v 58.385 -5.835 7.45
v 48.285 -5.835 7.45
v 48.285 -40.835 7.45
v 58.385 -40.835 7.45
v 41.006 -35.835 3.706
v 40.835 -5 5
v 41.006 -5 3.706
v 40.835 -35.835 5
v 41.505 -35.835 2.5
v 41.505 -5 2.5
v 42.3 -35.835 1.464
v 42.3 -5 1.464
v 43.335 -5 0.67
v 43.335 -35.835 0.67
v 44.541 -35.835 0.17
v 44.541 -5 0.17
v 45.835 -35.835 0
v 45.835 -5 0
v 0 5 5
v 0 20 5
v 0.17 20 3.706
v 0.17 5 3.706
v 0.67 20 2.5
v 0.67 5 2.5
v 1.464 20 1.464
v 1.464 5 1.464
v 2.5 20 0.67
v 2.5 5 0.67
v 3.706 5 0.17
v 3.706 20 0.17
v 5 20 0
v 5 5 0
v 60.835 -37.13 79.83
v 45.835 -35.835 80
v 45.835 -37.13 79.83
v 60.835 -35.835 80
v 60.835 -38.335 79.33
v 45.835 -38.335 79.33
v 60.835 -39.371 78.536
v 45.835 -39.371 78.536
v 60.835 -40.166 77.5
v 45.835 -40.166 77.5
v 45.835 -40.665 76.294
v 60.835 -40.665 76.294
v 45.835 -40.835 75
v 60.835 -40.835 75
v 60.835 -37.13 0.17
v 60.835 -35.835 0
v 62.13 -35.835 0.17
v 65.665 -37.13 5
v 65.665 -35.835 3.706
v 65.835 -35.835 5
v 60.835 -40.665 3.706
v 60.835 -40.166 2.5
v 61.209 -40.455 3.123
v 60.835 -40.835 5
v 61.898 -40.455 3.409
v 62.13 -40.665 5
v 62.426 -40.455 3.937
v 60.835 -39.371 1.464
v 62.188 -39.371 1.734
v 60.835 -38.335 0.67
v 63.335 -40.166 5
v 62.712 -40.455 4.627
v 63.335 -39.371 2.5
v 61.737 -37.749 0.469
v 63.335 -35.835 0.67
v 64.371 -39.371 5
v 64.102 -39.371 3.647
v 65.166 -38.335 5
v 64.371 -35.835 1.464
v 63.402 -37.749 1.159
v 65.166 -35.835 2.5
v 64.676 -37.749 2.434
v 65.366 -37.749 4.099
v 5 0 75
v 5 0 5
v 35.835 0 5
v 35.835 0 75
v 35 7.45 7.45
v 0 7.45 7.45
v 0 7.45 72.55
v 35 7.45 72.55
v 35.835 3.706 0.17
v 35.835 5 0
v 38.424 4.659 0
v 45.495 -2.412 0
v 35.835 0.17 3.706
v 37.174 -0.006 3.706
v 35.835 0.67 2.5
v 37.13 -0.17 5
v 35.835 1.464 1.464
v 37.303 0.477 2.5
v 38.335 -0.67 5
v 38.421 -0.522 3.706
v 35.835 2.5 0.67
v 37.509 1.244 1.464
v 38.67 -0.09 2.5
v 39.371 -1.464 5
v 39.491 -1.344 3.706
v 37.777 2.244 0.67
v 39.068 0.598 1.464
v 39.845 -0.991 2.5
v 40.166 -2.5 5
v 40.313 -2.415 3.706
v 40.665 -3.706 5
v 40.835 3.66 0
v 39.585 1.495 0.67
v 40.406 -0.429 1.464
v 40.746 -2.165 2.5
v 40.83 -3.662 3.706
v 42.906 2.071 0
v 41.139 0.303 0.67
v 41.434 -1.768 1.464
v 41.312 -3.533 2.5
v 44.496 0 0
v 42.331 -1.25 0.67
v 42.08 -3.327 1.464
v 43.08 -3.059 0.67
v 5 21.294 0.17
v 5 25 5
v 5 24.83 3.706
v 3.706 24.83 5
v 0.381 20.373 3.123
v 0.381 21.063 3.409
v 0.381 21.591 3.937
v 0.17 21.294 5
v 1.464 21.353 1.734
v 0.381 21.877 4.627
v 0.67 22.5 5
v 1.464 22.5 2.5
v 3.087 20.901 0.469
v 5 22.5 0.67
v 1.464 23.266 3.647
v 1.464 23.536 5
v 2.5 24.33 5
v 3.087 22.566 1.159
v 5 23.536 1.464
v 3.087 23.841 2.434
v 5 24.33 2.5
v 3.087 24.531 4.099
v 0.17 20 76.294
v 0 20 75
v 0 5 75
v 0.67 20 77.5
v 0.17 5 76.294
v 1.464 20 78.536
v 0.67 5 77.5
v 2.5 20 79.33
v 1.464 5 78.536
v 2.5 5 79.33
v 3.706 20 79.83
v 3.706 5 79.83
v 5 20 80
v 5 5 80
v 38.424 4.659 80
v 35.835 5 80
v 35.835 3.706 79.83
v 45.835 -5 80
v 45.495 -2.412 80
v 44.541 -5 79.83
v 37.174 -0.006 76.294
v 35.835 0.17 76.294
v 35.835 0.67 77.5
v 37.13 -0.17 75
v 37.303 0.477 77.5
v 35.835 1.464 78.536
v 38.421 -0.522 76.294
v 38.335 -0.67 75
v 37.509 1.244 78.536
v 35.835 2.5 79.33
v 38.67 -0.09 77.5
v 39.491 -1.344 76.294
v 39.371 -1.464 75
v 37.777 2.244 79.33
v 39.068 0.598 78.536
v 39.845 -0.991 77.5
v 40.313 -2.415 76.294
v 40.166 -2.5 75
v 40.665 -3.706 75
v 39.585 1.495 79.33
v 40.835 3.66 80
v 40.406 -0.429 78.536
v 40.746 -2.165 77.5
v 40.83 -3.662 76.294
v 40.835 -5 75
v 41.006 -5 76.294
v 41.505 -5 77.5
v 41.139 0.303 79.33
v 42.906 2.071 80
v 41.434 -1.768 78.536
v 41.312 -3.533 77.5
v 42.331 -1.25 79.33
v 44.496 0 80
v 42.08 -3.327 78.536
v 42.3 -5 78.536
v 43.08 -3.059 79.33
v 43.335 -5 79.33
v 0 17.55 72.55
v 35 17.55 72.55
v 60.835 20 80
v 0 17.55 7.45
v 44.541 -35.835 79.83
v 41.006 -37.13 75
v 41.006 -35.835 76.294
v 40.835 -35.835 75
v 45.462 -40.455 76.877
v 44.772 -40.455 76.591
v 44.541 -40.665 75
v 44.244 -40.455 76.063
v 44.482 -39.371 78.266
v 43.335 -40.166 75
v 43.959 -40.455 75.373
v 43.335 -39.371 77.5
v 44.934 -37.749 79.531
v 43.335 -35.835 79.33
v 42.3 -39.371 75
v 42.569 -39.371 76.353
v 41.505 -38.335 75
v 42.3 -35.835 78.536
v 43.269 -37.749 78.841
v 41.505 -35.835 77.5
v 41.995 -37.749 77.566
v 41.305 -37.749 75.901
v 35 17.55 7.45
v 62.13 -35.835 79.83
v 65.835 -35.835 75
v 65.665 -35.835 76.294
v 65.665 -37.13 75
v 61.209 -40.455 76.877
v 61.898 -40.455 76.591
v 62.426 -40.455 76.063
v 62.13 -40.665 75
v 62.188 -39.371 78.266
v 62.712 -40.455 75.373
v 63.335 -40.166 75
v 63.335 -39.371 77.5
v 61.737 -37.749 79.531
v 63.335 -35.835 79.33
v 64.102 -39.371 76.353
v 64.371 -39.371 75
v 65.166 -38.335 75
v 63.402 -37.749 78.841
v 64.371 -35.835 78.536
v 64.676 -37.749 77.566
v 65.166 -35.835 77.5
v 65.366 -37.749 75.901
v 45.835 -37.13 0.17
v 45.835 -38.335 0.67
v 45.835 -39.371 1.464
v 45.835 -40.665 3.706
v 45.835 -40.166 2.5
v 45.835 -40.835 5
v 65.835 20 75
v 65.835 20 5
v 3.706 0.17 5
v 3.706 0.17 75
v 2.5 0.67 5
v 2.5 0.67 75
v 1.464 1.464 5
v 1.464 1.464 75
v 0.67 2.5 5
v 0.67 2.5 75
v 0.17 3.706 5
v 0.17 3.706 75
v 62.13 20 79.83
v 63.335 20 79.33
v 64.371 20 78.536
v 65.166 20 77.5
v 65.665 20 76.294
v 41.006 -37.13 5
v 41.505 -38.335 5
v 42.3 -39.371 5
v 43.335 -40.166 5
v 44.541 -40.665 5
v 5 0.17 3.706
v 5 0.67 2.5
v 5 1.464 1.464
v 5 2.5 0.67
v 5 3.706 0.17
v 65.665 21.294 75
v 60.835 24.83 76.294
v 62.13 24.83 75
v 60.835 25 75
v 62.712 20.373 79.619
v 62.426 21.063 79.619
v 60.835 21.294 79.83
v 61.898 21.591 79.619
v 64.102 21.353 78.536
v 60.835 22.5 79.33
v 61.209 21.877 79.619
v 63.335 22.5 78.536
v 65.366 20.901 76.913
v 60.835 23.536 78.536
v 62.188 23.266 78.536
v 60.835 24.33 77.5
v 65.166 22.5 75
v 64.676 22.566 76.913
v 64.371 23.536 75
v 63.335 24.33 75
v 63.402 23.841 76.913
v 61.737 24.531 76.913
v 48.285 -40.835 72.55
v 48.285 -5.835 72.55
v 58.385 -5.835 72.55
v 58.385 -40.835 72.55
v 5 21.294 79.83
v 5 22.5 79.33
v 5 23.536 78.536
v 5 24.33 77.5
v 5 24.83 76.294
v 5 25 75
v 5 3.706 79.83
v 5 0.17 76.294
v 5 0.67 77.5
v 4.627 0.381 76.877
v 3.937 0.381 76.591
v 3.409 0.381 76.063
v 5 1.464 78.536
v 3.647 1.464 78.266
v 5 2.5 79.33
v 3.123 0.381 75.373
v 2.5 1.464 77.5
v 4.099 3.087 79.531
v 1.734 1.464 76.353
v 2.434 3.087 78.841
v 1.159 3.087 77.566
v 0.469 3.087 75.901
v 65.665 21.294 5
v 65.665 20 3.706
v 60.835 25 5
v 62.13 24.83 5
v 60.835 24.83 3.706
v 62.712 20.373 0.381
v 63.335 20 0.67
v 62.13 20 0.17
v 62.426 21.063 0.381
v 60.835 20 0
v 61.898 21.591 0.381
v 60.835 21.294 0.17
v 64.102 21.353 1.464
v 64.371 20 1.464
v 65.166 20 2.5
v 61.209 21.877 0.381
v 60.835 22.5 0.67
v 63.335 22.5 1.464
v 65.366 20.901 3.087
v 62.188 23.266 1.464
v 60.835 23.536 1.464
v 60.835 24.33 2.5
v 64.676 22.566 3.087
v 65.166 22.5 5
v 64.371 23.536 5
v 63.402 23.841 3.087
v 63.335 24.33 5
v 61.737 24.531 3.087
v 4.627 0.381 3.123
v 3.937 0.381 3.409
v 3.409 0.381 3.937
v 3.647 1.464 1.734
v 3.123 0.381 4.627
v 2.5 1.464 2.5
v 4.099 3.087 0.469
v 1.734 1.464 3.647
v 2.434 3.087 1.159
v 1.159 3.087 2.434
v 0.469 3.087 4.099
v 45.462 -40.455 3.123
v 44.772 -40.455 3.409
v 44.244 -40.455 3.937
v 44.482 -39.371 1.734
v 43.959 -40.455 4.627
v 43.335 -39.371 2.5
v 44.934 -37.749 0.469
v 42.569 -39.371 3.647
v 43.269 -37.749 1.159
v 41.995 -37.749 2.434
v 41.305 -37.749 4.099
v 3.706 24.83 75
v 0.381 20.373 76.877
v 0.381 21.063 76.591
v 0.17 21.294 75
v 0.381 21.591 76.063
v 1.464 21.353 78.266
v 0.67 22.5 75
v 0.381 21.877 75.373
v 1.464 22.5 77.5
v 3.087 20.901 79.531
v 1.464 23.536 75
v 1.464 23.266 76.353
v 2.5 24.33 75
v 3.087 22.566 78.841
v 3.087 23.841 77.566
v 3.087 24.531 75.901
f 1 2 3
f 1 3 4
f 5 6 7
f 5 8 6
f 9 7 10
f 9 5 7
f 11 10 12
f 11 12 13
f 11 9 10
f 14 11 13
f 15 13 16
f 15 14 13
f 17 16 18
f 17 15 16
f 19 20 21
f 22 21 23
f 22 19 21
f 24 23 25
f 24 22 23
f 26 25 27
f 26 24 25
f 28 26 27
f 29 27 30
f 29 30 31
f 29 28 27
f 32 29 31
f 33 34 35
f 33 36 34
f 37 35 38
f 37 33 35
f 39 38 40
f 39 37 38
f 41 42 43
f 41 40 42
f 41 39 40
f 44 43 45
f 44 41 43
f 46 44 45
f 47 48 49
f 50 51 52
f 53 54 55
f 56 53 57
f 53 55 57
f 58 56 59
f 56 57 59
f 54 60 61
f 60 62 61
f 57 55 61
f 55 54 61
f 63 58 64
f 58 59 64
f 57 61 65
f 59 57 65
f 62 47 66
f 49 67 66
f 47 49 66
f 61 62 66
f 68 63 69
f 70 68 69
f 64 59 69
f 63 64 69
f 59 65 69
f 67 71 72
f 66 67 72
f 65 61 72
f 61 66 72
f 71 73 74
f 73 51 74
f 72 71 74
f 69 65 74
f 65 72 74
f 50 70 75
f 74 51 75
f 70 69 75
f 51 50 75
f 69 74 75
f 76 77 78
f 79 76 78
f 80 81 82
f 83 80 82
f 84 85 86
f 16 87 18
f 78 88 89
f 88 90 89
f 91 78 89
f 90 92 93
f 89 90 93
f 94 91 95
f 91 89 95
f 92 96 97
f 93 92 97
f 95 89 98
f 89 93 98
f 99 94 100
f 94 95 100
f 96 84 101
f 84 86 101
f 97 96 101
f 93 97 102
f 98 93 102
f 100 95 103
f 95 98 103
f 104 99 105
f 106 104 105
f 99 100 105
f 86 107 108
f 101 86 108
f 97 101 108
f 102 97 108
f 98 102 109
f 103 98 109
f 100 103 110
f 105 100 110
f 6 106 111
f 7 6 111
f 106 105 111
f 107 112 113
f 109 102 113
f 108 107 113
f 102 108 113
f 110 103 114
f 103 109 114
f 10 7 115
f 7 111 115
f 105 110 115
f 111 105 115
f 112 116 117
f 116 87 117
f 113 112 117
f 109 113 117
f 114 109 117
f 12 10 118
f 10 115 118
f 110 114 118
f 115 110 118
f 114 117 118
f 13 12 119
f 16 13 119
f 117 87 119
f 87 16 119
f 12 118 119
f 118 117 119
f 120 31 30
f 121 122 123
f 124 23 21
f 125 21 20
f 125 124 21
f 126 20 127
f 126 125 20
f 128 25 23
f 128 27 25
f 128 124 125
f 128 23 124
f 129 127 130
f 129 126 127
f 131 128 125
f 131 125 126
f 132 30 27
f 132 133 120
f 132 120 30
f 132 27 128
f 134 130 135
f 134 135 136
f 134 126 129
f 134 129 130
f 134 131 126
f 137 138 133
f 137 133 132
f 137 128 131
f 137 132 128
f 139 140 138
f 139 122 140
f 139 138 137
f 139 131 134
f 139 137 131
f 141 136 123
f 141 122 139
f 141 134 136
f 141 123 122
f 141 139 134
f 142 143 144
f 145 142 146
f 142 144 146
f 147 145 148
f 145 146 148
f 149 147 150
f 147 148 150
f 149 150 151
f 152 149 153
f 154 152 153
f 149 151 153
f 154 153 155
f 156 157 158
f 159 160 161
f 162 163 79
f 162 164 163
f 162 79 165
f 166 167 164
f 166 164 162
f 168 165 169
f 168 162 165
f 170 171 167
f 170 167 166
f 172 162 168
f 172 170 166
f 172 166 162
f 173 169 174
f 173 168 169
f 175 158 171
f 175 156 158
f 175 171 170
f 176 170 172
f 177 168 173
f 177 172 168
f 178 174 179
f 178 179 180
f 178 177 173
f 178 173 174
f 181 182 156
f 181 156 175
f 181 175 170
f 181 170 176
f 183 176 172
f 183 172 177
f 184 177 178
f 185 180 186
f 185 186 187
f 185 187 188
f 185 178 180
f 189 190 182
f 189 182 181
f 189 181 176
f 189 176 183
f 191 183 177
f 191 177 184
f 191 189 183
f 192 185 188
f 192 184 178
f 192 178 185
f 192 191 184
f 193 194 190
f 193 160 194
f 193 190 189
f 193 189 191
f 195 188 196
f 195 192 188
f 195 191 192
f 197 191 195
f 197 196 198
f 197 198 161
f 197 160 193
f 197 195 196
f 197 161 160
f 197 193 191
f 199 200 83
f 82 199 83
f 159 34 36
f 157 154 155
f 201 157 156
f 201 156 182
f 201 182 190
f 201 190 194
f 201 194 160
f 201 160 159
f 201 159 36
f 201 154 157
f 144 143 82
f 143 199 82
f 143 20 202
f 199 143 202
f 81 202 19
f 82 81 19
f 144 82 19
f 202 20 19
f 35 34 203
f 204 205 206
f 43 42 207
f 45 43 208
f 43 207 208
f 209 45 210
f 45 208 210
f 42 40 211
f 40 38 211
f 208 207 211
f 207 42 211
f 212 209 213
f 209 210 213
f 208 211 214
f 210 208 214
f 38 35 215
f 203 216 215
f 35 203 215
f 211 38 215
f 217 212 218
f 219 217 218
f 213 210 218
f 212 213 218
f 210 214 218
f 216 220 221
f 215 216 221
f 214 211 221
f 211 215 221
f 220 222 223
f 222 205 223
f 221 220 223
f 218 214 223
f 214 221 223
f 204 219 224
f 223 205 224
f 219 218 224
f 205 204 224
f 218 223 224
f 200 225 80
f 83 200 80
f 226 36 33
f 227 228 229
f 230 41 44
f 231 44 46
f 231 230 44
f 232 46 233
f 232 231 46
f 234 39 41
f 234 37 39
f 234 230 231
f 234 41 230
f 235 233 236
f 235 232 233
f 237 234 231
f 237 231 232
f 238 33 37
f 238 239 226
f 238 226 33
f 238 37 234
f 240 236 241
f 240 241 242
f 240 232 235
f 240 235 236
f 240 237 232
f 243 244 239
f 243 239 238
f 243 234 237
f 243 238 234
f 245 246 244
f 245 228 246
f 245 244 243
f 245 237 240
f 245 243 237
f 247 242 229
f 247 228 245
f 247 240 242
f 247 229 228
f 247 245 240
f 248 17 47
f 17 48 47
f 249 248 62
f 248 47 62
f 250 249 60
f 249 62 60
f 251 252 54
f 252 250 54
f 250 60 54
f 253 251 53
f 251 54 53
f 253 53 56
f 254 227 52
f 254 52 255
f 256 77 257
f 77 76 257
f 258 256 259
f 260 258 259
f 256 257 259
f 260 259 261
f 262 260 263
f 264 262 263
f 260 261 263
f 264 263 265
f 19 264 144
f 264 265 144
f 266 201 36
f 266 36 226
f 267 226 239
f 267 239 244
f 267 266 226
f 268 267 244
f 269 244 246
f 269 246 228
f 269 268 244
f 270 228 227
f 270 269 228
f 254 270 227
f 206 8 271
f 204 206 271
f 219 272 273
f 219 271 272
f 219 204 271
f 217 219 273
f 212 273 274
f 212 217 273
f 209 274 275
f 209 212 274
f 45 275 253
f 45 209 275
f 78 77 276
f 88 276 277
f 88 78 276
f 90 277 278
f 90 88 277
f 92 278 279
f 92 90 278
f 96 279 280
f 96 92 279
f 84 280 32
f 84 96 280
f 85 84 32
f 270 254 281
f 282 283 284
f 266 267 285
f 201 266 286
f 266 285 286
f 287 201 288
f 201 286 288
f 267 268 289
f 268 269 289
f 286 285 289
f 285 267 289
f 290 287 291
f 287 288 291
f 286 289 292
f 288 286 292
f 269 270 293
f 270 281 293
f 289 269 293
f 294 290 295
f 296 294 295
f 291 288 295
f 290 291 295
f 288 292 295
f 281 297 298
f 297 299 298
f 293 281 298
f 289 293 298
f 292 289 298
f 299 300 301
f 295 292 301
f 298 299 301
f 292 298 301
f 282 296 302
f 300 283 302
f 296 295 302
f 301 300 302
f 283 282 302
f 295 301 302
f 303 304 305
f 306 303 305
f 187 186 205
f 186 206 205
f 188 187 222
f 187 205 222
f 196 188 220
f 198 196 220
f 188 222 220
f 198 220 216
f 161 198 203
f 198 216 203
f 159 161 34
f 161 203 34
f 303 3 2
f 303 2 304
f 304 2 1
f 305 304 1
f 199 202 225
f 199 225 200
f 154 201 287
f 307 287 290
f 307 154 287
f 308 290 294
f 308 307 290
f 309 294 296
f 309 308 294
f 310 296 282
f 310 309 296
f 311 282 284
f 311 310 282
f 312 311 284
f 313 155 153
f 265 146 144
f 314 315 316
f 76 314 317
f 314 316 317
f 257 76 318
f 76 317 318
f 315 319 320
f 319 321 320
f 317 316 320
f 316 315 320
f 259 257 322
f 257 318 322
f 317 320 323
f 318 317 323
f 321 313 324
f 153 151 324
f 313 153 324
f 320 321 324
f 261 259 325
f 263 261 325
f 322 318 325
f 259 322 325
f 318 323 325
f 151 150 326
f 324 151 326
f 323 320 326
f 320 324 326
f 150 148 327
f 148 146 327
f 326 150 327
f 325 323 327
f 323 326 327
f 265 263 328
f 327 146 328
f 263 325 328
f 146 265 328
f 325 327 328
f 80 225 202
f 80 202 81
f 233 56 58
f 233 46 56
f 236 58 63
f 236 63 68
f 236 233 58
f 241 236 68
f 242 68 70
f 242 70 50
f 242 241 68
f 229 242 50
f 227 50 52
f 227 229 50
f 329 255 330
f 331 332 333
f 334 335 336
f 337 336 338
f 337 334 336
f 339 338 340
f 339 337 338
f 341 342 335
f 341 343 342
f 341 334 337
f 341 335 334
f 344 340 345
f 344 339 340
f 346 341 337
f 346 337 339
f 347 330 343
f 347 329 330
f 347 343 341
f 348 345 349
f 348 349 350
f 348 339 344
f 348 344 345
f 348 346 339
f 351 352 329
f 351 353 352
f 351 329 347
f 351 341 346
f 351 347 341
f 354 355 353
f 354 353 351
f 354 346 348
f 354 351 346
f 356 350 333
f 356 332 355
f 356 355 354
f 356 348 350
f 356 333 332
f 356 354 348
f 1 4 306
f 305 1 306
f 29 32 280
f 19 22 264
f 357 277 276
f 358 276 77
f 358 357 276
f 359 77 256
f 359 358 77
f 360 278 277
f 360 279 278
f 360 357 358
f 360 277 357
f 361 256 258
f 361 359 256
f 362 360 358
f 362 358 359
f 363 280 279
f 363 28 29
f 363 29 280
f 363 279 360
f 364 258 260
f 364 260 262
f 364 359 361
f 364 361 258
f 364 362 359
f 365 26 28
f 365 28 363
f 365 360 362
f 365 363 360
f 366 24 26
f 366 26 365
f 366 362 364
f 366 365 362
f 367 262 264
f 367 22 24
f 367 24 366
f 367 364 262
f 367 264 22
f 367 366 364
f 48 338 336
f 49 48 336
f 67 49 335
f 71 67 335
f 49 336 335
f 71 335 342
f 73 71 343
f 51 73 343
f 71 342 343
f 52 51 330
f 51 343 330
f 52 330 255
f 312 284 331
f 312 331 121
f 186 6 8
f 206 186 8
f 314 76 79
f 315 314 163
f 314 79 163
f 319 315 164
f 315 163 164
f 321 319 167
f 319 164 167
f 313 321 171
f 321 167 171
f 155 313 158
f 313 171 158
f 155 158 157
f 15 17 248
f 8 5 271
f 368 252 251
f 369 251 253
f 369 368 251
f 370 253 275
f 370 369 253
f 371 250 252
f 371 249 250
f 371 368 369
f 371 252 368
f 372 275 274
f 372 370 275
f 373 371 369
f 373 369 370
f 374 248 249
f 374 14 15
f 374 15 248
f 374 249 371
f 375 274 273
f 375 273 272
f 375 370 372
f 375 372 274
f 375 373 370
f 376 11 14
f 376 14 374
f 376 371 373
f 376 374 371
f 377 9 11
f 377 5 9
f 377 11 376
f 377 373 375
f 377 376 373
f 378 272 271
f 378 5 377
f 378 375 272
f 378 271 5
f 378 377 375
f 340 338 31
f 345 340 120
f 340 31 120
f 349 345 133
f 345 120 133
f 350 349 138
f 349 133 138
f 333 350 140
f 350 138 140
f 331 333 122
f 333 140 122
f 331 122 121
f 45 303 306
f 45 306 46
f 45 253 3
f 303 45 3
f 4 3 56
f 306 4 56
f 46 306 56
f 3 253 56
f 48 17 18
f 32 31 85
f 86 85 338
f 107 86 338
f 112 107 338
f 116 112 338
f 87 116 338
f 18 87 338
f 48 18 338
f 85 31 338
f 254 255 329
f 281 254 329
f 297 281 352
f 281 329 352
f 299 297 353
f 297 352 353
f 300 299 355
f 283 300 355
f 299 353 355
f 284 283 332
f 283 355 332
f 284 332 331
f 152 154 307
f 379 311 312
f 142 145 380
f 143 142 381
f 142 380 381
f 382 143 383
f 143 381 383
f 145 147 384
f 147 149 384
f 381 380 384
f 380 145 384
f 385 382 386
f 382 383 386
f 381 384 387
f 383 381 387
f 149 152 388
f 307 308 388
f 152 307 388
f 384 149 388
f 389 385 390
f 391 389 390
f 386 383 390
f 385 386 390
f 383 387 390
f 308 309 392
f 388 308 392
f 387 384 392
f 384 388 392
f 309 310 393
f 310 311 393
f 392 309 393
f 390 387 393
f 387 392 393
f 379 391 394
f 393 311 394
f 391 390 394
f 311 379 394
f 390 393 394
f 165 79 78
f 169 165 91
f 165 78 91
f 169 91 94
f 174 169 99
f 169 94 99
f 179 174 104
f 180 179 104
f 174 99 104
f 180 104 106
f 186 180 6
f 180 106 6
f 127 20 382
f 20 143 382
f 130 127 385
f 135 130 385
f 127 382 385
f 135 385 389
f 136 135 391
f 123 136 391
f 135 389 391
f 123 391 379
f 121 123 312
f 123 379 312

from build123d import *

# Parameters (mm, degrees)
F0_W     = 35
F0_H     = 10.1
F0_W_2   = 10.1
F0_H_2   = 35
F1_DEPTH = 80
F3_W     = 10.1
F3_H     = 65.1
F4_DEPTH = 35
F2_W     = 10.1
F2_H     = 65.1
F5_DEPTH = 35
F6_R     = 5


with BuildPart() as f1:
    # F0 (on Top) → F1 (new body)
    with BuildSketch(Plane.XY):
        with BuildLine():
            Line((0, 7.45), (0, 0))
            Line((0, 0), (35.8354191061, 0))
            ThreePointArc((35.8354191061, 0), (39.370953012, -1.4644660941), (40.8354191061, -5))
            Line((40.8354191061, -5), (40.8354191061, -40.8354191061))
            Line((40.8354191061, -40.8354191061), (48.2854191061, -40.8354191061))
            Line((48.2854191061, -40.8354191061), (48.2854191061, -5.8354191061))
            Line((48.2854191061, -5.8354191061), (58.3854191061, -5.8354191061))
            Line((58.3854191061, -5.8354191061), (58.3854191061, -40.8354191061))
            Line((58.3854191061, -40.8354191061), (65.8354191061, -40.8354191061))
            Line((65.8354191061, -40.8354191061), (65.8354191061, 20))
            ThreePointArc((65.8354191061, 20), (64.370953012, 23.5355339059), (60.8354191061, 25))
            Line((60.8354191061, 25), (0, 25))
            Line((0, 25), (0, 17.55))
            Line((0, 17.55), (35, 17.55))
            Line((35, 17.55), (35, 7.45))
            Line((35, 7.45), (0, 7.45))
        make_face()
        with Locations((17.5, 12.5)):
            Rectangle(F0_W, F0_H)
        with Locations((53.3354191061, -23.3354191061)):
            Rectangle(F0_W_2, F0_H_2)
    extrude(amount=F1_DEPTH)

    # F3 (on face) → F4 (cut)
    with BuildSketch(Plane.XZ.offset(40.8354191061)):
        with Locations((53.3354191061, 40)):
            Rectangle(F3_W, F3_H)
    extrude(amount=-F4_DEPTH, mode=Mode.SUBTRACT)

    # F2 (on face) → F5 (cut)
    with BuildSketch(Plane(origin=(0, 0, 0), x_dir=(0, -1, 0), z_dir=(-1, 0, 0))):
        with Locations((-12.5, 40)):
            Rectangle(F2_W, F2_H)
    extrude(amount=-F5_DEPTH, mode=Mode.SUBTRACT)

    # F6
    f6_edges = [f1.edges().sort_by_distance(p)[0] for p in [
        (64.370953, 23.535534, 80),
        (30.41771, 25, 80),
        (0, 12.5, 80),
        (17.91771, 0, 80),
        (39.370953, -1.464466, 80),
        (40.835419, -22.91771, 80),
        (53.335419, -40.835419, 80),
        (65.835419, -10.41771, 80),
        (64.370953, 23.535534, 0),
        (30.41771, 25, 0),
        (0, 12.5, 0),
        (17.91771, 0, 0),
        (39.370953, -1.464466, 0),
        (40.835419, -22.91771, 0),
        (53.335419, -40.835419, 0),
        (65.835419, -10.41771, 0),
        (65.835419, -40.835419, 40),
        (40.835419, -40.835419, 40),
        (0, 0, 40),
        (0, 25, 40),
    ]]
    fillet(f6_edges, radius=F6_R)


solid = f1.part
